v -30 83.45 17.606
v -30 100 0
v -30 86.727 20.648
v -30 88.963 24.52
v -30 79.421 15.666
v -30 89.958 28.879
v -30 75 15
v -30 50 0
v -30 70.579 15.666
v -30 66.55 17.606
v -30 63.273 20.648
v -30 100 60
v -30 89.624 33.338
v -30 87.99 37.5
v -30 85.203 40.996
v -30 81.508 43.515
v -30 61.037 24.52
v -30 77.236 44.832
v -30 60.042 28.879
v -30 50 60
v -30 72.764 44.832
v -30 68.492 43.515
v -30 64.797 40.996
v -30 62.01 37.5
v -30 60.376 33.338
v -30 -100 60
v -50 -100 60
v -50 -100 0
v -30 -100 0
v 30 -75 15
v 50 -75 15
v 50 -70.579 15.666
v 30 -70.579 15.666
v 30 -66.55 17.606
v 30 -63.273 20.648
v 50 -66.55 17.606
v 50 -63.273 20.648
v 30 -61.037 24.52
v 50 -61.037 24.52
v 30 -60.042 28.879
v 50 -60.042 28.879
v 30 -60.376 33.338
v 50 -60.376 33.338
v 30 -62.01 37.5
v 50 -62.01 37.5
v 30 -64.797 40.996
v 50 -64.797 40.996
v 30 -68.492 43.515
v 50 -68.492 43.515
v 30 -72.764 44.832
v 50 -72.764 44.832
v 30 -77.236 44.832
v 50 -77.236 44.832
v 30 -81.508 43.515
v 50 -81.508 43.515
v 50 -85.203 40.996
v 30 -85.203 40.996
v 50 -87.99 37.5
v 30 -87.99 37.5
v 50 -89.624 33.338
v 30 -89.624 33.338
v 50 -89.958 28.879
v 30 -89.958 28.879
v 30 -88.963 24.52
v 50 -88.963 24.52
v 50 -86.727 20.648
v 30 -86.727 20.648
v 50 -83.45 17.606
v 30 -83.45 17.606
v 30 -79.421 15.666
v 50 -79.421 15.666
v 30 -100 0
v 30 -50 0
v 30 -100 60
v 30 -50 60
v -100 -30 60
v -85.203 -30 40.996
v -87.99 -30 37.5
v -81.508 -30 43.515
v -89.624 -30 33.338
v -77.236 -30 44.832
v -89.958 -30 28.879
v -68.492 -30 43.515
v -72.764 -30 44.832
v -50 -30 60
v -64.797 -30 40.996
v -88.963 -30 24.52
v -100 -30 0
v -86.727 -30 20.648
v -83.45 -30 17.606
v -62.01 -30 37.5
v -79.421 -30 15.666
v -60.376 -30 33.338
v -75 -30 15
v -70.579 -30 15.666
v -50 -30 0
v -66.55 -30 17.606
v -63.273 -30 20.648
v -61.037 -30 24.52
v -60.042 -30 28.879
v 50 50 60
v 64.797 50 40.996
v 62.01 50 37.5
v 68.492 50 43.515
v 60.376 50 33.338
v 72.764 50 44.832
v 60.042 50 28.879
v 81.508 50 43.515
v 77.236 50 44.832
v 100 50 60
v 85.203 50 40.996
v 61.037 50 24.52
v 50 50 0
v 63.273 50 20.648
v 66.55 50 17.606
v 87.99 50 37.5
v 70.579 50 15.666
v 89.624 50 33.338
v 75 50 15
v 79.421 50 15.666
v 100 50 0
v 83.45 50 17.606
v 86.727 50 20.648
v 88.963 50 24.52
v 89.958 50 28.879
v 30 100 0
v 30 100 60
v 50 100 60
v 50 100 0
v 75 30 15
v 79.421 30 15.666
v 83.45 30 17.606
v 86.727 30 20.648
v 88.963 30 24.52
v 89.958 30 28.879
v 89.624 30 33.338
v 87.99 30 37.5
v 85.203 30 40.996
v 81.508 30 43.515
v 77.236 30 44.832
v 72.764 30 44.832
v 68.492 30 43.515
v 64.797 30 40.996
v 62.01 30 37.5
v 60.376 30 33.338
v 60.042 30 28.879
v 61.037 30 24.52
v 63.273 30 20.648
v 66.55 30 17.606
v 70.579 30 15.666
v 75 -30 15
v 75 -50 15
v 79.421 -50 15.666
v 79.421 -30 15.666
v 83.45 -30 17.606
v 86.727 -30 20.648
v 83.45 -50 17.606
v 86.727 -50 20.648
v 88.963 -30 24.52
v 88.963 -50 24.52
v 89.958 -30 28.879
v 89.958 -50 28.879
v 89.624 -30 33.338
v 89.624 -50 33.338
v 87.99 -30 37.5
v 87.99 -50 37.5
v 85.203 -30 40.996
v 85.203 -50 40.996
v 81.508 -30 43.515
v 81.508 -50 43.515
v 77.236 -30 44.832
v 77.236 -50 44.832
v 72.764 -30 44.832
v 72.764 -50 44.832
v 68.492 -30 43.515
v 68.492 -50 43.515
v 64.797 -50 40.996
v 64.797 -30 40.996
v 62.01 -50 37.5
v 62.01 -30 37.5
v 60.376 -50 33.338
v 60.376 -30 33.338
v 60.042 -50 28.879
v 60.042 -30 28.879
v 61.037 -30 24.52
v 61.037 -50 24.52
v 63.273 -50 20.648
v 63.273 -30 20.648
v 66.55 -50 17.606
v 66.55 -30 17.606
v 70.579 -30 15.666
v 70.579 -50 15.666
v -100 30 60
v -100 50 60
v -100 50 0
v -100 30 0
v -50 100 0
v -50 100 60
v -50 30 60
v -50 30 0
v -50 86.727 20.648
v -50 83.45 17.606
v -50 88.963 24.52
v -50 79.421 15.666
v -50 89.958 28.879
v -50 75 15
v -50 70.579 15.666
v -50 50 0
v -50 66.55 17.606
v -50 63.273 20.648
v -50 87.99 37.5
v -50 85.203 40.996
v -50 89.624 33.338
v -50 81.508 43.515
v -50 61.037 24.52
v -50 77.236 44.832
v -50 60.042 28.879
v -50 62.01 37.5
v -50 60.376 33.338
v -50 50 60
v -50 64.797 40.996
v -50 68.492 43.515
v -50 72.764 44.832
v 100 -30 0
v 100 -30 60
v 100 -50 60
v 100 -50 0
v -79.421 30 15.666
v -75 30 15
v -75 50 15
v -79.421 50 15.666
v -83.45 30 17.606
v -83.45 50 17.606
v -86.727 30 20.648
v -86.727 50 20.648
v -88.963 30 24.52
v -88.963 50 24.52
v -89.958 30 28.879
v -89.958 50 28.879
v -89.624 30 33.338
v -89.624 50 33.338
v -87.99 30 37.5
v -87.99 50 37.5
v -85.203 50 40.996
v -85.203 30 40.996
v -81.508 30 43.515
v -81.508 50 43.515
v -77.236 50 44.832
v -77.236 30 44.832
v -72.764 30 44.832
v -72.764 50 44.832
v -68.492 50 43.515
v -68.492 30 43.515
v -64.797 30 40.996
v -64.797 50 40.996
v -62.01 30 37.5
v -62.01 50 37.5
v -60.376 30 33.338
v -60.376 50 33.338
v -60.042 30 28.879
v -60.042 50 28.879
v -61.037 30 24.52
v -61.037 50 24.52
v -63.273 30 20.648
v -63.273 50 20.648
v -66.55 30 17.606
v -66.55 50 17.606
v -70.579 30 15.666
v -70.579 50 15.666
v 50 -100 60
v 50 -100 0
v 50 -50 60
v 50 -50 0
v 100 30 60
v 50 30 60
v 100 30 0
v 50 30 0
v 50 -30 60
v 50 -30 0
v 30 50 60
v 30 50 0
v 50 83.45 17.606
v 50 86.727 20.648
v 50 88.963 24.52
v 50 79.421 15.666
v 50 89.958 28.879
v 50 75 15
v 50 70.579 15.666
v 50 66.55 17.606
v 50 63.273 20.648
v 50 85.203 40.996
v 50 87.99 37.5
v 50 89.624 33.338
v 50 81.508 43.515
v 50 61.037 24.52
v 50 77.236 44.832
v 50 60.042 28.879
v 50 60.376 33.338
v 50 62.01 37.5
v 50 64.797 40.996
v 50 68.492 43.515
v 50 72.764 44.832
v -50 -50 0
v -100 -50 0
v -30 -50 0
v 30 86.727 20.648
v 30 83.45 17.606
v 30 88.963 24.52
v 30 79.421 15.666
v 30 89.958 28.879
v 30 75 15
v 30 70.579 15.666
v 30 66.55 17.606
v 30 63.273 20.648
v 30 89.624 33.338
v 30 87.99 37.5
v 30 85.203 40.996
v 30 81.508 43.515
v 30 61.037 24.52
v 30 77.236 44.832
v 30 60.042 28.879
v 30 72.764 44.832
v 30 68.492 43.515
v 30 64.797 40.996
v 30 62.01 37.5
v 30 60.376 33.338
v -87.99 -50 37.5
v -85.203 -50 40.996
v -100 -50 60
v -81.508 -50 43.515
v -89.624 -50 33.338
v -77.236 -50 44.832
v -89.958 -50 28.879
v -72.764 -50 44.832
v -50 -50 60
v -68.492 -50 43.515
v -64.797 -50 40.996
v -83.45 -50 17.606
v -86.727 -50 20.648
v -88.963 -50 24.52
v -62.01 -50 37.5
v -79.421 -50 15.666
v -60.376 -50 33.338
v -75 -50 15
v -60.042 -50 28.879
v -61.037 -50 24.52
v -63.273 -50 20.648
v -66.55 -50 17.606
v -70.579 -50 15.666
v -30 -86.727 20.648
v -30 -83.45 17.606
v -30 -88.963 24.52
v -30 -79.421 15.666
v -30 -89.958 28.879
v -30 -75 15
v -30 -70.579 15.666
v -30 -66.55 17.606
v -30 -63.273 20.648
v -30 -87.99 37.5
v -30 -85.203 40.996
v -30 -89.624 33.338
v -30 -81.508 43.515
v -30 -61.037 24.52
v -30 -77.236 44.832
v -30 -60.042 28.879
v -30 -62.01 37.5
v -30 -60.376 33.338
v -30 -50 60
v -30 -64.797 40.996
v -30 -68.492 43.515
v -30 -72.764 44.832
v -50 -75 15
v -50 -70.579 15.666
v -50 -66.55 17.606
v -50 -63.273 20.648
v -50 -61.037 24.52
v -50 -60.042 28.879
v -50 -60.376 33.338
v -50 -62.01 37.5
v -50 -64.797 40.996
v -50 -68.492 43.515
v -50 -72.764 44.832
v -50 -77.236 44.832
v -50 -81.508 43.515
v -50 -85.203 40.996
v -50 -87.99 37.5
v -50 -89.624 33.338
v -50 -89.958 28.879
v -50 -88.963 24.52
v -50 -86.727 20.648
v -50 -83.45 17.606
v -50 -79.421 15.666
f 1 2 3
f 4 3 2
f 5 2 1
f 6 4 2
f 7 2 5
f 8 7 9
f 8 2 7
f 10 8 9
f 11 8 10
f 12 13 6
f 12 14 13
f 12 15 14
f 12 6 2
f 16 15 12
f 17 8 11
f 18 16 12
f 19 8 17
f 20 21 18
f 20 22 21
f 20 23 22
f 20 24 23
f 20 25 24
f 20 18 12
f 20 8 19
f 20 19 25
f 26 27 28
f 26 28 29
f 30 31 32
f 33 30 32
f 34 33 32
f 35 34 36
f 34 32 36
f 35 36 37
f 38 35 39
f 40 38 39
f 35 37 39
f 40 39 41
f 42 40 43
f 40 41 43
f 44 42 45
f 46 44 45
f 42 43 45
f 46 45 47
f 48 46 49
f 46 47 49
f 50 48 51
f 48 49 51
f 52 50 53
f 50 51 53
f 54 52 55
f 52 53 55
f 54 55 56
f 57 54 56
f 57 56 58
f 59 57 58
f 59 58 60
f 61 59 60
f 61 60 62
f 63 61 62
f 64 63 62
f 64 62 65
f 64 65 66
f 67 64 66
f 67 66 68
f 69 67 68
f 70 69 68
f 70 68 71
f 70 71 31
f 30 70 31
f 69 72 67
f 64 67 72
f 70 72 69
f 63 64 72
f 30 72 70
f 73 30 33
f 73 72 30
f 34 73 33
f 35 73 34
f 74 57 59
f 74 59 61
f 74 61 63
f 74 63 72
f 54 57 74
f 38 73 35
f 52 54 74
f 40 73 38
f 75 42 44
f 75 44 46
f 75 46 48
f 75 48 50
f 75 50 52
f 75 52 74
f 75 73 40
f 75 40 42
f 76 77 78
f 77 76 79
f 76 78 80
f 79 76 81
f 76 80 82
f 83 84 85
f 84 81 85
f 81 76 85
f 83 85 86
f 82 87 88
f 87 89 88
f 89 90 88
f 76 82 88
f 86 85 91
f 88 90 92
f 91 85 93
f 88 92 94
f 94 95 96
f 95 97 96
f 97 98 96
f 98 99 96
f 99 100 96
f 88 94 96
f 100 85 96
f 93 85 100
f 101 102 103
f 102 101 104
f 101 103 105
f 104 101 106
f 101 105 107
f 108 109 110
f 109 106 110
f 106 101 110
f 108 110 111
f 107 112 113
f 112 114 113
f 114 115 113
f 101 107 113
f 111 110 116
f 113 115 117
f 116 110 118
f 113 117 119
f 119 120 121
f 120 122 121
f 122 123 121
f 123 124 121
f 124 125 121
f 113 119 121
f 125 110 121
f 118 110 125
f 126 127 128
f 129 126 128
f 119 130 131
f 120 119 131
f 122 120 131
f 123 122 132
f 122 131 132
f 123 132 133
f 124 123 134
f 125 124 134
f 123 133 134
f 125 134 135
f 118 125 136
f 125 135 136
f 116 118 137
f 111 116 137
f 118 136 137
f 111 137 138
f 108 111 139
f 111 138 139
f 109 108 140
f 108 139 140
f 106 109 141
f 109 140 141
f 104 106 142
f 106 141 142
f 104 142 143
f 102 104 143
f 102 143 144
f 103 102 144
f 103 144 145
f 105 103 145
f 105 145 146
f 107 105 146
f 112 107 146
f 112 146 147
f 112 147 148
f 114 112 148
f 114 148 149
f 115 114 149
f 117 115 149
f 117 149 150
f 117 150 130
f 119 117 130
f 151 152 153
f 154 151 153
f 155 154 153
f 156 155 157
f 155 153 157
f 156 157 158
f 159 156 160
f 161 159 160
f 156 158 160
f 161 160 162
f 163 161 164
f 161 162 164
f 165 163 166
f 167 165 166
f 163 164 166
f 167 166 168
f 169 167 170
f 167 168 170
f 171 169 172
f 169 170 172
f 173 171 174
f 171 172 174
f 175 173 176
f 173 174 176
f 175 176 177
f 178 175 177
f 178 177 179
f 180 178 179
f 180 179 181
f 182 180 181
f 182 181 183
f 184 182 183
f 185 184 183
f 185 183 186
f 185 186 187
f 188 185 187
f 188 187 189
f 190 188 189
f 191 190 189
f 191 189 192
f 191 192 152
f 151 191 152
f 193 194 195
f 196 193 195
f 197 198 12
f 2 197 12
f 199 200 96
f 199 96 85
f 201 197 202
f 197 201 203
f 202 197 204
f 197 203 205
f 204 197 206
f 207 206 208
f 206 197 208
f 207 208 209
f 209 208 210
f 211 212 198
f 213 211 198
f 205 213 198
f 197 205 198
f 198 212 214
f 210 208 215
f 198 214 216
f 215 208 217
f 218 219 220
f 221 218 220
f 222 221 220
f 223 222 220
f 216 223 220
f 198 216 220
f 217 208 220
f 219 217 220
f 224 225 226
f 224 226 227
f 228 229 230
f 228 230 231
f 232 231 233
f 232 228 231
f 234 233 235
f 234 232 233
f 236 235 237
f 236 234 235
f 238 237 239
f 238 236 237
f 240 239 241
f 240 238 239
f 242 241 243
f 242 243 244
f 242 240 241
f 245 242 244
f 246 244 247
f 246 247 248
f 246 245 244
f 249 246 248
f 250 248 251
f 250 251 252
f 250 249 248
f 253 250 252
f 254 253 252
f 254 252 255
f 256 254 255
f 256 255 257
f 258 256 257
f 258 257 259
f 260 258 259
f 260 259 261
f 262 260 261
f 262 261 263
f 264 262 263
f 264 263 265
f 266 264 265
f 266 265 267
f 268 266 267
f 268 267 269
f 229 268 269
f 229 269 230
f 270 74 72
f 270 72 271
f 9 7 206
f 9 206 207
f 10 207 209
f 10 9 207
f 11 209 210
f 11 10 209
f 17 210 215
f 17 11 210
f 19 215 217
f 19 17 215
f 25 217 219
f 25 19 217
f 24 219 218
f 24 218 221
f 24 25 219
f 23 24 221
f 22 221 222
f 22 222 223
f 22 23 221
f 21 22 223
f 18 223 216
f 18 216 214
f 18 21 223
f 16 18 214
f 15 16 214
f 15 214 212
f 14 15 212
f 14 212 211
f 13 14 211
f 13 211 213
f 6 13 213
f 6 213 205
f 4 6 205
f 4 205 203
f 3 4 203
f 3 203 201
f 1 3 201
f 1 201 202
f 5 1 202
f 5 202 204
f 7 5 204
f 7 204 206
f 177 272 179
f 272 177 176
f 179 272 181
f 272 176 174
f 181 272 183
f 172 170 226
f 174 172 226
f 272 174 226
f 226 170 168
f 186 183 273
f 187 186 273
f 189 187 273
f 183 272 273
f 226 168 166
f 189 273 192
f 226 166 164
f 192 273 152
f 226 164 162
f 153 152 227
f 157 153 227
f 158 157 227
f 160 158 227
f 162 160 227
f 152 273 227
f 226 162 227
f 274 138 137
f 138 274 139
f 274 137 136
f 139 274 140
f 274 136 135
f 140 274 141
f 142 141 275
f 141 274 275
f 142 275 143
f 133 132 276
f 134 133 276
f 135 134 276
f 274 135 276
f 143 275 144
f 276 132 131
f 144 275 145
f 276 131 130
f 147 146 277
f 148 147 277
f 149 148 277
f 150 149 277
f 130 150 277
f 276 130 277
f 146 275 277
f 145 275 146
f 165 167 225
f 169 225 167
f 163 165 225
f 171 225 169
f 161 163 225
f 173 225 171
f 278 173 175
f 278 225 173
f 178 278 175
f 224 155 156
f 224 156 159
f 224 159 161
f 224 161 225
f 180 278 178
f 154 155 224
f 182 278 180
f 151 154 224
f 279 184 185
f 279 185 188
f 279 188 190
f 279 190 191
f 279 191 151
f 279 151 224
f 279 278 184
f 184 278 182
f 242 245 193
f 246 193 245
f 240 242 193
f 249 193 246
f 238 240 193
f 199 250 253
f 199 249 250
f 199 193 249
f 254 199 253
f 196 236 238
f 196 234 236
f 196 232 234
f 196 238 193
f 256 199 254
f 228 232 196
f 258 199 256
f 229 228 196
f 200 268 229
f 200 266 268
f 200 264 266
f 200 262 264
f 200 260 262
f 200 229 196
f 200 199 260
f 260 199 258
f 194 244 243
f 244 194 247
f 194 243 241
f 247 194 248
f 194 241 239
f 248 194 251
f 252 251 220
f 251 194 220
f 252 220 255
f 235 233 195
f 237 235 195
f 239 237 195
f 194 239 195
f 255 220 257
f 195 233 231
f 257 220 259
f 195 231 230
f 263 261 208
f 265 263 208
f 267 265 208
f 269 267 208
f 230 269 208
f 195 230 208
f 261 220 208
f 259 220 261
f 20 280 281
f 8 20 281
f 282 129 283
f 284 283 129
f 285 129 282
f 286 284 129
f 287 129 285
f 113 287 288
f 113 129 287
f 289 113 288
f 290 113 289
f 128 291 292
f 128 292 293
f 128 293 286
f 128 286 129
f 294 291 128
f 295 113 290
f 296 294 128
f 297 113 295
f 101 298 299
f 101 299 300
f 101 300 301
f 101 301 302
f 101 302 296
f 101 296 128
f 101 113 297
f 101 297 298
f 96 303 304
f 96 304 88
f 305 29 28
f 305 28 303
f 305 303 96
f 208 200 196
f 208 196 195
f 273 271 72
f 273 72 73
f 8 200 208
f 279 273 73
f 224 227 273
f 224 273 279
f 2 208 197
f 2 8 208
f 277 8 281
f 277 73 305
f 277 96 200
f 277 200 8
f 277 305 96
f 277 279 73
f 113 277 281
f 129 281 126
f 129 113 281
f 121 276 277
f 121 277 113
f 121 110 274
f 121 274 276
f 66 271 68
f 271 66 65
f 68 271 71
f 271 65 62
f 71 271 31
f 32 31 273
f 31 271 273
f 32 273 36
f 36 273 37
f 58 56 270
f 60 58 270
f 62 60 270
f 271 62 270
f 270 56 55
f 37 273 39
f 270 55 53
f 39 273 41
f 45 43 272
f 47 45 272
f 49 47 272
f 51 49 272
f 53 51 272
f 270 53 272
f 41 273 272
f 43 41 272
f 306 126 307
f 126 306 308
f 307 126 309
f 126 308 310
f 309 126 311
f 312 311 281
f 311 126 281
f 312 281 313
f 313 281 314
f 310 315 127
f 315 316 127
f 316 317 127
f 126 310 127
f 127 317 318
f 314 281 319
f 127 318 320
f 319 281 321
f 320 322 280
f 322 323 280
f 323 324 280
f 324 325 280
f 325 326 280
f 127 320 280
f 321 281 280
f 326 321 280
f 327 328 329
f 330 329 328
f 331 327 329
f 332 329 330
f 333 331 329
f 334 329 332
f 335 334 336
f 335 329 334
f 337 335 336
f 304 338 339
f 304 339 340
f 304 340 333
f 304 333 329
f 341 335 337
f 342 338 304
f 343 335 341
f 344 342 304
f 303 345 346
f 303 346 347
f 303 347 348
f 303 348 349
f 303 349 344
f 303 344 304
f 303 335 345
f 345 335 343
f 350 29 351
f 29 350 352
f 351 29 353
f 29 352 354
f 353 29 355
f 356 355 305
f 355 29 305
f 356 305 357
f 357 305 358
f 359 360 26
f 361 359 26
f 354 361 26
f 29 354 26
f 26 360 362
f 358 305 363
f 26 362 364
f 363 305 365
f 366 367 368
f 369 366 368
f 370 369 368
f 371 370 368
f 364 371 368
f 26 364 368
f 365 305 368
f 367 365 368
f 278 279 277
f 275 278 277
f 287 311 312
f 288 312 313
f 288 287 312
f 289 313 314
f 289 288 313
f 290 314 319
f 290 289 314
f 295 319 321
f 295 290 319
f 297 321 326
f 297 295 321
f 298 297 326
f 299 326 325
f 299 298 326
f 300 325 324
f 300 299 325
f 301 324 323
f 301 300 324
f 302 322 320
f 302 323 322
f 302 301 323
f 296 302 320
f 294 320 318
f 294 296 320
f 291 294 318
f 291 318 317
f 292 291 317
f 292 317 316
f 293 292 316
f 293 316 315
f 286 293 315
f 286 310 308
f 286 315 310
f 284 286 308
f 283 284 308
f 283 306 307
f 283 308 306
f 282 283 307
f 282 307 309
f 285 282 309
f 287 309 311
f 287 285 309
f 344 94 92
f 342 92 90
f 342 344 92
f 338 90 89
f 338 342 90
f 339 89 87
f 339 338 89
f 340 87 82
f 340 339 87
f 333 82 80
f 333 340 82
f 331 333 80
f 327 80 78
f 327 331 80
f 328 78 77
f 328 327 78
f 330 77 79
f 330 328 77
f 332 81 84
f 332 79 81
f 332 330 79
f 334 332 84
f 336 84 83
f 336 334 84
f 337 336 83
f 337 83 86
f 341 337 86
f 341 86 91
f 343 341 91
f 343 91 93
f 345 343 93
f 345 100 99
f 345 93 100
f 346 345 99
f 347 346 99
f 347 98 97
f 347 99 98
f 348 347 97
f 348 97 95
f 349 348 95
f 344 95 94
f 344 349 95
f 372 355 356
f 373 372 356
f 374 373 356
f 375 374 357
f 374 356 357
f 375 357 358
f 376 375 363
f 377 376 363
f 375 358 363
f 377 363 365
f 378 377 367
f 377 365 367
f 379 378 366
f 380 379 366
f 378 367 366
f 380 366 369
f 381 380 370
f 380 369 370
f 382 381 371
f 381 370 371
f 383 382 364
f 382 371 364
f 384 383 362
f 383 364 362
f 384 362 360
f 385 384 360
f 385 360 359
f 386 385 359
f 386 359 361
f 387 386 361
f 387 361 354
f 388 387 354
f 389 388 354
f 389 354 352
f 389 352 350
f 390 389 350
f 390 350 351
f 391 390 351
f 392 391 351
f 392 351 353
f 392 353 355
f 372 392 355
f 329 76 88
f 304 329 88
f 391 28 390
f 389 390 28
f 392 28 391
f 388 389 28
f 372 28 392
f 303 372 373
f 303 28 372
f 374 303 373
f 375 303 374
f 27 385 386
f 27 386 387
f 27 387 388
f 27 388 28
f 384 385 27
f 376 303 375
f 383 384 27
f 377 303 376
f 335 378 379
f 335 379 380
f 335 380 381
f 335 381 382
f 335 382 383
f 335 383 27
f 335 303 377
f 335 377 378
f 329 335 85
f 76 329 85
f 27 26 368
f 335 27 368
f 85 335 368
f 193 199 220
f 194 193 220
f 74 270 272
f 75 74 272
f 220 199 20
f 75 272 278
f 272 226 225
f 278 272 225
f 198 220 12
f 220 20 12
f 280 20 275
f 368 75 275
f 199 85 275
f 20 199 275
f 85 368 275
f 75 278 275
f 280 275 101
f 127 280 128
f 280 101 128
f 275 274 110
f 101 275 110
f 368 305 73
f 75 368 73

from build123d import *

# Parameters (mm, degrees)
SKETCH1_W           = 100
SKETCH1_H           = 100
BOSS_EXTRUDE1_DEPTH = 60
SKETCH2_W           = 60
SKETCH2_H           = 20
BOSS_EXTRUDE2_DEPTH = 50
SKETCH3_W           = 20
SKETCH3_H           = 60
BOSS_EXTRUDE3_DEPTH = 50
SKETCH4_R           = 15
CUT_EXTRUDE1_DEPTH  = 100
SKETCH5_R           = 15
CUT_EXTRUDE2_DEPTH  = 100


with BuildPart() as part:
    # Sketch1 → Boss-Extrude1 (new body)
    with BuildSketch(Plane.XY):
        Rectangle(SKETCH1_W, SKETCH1_H)
    extrude(amount=BOSS_EXTRUDE1_DEPTH)

    # Sketch2 → Boss-Extrude2 (add)
    with BuildSketch(Plane(origin=(50, 0, 0), x_dir=(0, 0, -1), z_dir=(1, 0, 0))):
        with Locations((-30, 40)):
            Rectangle(SKETCH2_W, SKETCH2_H)
        with Locations((-30, -40)):
            Rectangle(SKETCH2_W, SKETCH2_H)
    boss_extrude2 = extrude(amount=BOSS_EXTRUDE2_DEPTH)

    # Sketch3 → Boss-Extrude3 (add)
    with BuildSketch(Plane.XZ.offset(50)):
        with Locations((-40, 30)):
            Rectangle(SKETCH3_W, SKETCH3_H)
        with Locations((40, 30)):
            Rectangle(SKETCH3_W, SKETCH3_H)
    boss_extrude3 = extrude(amount=BOSS_EXTRUDE3_DEPTH)

    # Sketch4 → Cut-Extrude1 (cut)
    with BuildSketch(Plane.XZ.offset(50)):
        with Locations(Location((75, 30, 0), (0, 0, 270))):
            Circle(SKETCH4_R)
    cut_extrude1 = extrude(amount=-CUT_EXTRUDE1_DEPTH, mode=Mode.SUBTRACT)

    # Sketch5 → Cut-Extrude2 (cut)
    with BuildSketch(Plane(origin=(50, 0, 0), x_dir=(0, 0, -1), z_dir=(1, 0, 0))):
        with Locations((-30, -75)):
            Circle(SKETCH5_R)
    cut_extrude2 = extrude(amount=-CUT_EXTRUDE2_DEPTH, mode=Mode.SUBTRACT)

    # Mirror2: Boss-Extrude2, Cut-Extrude1 across plane
    add(boss_extrude2.mirror(Plane(origin=(0, 0, 0), x_dir=(0, 0, 1), z_dir=(1, 0, 0))))
    add(cut_extrude1.mirror(Plane(origin=(0, 0, 0), x_dir=(0, 0, 1), z_dir=(1, 0, 0))), mode=Mode.SUBTRACT)

    # Mirror3: Boss-Extrude3, Cut-Extrude2 across plane
    add(boss_extrude3.mirror(Plane.ZX))
    add(cut_extrude2.mirror(Plane.ZX), mode=Mode.SUBTRACT)


solid = part.part
